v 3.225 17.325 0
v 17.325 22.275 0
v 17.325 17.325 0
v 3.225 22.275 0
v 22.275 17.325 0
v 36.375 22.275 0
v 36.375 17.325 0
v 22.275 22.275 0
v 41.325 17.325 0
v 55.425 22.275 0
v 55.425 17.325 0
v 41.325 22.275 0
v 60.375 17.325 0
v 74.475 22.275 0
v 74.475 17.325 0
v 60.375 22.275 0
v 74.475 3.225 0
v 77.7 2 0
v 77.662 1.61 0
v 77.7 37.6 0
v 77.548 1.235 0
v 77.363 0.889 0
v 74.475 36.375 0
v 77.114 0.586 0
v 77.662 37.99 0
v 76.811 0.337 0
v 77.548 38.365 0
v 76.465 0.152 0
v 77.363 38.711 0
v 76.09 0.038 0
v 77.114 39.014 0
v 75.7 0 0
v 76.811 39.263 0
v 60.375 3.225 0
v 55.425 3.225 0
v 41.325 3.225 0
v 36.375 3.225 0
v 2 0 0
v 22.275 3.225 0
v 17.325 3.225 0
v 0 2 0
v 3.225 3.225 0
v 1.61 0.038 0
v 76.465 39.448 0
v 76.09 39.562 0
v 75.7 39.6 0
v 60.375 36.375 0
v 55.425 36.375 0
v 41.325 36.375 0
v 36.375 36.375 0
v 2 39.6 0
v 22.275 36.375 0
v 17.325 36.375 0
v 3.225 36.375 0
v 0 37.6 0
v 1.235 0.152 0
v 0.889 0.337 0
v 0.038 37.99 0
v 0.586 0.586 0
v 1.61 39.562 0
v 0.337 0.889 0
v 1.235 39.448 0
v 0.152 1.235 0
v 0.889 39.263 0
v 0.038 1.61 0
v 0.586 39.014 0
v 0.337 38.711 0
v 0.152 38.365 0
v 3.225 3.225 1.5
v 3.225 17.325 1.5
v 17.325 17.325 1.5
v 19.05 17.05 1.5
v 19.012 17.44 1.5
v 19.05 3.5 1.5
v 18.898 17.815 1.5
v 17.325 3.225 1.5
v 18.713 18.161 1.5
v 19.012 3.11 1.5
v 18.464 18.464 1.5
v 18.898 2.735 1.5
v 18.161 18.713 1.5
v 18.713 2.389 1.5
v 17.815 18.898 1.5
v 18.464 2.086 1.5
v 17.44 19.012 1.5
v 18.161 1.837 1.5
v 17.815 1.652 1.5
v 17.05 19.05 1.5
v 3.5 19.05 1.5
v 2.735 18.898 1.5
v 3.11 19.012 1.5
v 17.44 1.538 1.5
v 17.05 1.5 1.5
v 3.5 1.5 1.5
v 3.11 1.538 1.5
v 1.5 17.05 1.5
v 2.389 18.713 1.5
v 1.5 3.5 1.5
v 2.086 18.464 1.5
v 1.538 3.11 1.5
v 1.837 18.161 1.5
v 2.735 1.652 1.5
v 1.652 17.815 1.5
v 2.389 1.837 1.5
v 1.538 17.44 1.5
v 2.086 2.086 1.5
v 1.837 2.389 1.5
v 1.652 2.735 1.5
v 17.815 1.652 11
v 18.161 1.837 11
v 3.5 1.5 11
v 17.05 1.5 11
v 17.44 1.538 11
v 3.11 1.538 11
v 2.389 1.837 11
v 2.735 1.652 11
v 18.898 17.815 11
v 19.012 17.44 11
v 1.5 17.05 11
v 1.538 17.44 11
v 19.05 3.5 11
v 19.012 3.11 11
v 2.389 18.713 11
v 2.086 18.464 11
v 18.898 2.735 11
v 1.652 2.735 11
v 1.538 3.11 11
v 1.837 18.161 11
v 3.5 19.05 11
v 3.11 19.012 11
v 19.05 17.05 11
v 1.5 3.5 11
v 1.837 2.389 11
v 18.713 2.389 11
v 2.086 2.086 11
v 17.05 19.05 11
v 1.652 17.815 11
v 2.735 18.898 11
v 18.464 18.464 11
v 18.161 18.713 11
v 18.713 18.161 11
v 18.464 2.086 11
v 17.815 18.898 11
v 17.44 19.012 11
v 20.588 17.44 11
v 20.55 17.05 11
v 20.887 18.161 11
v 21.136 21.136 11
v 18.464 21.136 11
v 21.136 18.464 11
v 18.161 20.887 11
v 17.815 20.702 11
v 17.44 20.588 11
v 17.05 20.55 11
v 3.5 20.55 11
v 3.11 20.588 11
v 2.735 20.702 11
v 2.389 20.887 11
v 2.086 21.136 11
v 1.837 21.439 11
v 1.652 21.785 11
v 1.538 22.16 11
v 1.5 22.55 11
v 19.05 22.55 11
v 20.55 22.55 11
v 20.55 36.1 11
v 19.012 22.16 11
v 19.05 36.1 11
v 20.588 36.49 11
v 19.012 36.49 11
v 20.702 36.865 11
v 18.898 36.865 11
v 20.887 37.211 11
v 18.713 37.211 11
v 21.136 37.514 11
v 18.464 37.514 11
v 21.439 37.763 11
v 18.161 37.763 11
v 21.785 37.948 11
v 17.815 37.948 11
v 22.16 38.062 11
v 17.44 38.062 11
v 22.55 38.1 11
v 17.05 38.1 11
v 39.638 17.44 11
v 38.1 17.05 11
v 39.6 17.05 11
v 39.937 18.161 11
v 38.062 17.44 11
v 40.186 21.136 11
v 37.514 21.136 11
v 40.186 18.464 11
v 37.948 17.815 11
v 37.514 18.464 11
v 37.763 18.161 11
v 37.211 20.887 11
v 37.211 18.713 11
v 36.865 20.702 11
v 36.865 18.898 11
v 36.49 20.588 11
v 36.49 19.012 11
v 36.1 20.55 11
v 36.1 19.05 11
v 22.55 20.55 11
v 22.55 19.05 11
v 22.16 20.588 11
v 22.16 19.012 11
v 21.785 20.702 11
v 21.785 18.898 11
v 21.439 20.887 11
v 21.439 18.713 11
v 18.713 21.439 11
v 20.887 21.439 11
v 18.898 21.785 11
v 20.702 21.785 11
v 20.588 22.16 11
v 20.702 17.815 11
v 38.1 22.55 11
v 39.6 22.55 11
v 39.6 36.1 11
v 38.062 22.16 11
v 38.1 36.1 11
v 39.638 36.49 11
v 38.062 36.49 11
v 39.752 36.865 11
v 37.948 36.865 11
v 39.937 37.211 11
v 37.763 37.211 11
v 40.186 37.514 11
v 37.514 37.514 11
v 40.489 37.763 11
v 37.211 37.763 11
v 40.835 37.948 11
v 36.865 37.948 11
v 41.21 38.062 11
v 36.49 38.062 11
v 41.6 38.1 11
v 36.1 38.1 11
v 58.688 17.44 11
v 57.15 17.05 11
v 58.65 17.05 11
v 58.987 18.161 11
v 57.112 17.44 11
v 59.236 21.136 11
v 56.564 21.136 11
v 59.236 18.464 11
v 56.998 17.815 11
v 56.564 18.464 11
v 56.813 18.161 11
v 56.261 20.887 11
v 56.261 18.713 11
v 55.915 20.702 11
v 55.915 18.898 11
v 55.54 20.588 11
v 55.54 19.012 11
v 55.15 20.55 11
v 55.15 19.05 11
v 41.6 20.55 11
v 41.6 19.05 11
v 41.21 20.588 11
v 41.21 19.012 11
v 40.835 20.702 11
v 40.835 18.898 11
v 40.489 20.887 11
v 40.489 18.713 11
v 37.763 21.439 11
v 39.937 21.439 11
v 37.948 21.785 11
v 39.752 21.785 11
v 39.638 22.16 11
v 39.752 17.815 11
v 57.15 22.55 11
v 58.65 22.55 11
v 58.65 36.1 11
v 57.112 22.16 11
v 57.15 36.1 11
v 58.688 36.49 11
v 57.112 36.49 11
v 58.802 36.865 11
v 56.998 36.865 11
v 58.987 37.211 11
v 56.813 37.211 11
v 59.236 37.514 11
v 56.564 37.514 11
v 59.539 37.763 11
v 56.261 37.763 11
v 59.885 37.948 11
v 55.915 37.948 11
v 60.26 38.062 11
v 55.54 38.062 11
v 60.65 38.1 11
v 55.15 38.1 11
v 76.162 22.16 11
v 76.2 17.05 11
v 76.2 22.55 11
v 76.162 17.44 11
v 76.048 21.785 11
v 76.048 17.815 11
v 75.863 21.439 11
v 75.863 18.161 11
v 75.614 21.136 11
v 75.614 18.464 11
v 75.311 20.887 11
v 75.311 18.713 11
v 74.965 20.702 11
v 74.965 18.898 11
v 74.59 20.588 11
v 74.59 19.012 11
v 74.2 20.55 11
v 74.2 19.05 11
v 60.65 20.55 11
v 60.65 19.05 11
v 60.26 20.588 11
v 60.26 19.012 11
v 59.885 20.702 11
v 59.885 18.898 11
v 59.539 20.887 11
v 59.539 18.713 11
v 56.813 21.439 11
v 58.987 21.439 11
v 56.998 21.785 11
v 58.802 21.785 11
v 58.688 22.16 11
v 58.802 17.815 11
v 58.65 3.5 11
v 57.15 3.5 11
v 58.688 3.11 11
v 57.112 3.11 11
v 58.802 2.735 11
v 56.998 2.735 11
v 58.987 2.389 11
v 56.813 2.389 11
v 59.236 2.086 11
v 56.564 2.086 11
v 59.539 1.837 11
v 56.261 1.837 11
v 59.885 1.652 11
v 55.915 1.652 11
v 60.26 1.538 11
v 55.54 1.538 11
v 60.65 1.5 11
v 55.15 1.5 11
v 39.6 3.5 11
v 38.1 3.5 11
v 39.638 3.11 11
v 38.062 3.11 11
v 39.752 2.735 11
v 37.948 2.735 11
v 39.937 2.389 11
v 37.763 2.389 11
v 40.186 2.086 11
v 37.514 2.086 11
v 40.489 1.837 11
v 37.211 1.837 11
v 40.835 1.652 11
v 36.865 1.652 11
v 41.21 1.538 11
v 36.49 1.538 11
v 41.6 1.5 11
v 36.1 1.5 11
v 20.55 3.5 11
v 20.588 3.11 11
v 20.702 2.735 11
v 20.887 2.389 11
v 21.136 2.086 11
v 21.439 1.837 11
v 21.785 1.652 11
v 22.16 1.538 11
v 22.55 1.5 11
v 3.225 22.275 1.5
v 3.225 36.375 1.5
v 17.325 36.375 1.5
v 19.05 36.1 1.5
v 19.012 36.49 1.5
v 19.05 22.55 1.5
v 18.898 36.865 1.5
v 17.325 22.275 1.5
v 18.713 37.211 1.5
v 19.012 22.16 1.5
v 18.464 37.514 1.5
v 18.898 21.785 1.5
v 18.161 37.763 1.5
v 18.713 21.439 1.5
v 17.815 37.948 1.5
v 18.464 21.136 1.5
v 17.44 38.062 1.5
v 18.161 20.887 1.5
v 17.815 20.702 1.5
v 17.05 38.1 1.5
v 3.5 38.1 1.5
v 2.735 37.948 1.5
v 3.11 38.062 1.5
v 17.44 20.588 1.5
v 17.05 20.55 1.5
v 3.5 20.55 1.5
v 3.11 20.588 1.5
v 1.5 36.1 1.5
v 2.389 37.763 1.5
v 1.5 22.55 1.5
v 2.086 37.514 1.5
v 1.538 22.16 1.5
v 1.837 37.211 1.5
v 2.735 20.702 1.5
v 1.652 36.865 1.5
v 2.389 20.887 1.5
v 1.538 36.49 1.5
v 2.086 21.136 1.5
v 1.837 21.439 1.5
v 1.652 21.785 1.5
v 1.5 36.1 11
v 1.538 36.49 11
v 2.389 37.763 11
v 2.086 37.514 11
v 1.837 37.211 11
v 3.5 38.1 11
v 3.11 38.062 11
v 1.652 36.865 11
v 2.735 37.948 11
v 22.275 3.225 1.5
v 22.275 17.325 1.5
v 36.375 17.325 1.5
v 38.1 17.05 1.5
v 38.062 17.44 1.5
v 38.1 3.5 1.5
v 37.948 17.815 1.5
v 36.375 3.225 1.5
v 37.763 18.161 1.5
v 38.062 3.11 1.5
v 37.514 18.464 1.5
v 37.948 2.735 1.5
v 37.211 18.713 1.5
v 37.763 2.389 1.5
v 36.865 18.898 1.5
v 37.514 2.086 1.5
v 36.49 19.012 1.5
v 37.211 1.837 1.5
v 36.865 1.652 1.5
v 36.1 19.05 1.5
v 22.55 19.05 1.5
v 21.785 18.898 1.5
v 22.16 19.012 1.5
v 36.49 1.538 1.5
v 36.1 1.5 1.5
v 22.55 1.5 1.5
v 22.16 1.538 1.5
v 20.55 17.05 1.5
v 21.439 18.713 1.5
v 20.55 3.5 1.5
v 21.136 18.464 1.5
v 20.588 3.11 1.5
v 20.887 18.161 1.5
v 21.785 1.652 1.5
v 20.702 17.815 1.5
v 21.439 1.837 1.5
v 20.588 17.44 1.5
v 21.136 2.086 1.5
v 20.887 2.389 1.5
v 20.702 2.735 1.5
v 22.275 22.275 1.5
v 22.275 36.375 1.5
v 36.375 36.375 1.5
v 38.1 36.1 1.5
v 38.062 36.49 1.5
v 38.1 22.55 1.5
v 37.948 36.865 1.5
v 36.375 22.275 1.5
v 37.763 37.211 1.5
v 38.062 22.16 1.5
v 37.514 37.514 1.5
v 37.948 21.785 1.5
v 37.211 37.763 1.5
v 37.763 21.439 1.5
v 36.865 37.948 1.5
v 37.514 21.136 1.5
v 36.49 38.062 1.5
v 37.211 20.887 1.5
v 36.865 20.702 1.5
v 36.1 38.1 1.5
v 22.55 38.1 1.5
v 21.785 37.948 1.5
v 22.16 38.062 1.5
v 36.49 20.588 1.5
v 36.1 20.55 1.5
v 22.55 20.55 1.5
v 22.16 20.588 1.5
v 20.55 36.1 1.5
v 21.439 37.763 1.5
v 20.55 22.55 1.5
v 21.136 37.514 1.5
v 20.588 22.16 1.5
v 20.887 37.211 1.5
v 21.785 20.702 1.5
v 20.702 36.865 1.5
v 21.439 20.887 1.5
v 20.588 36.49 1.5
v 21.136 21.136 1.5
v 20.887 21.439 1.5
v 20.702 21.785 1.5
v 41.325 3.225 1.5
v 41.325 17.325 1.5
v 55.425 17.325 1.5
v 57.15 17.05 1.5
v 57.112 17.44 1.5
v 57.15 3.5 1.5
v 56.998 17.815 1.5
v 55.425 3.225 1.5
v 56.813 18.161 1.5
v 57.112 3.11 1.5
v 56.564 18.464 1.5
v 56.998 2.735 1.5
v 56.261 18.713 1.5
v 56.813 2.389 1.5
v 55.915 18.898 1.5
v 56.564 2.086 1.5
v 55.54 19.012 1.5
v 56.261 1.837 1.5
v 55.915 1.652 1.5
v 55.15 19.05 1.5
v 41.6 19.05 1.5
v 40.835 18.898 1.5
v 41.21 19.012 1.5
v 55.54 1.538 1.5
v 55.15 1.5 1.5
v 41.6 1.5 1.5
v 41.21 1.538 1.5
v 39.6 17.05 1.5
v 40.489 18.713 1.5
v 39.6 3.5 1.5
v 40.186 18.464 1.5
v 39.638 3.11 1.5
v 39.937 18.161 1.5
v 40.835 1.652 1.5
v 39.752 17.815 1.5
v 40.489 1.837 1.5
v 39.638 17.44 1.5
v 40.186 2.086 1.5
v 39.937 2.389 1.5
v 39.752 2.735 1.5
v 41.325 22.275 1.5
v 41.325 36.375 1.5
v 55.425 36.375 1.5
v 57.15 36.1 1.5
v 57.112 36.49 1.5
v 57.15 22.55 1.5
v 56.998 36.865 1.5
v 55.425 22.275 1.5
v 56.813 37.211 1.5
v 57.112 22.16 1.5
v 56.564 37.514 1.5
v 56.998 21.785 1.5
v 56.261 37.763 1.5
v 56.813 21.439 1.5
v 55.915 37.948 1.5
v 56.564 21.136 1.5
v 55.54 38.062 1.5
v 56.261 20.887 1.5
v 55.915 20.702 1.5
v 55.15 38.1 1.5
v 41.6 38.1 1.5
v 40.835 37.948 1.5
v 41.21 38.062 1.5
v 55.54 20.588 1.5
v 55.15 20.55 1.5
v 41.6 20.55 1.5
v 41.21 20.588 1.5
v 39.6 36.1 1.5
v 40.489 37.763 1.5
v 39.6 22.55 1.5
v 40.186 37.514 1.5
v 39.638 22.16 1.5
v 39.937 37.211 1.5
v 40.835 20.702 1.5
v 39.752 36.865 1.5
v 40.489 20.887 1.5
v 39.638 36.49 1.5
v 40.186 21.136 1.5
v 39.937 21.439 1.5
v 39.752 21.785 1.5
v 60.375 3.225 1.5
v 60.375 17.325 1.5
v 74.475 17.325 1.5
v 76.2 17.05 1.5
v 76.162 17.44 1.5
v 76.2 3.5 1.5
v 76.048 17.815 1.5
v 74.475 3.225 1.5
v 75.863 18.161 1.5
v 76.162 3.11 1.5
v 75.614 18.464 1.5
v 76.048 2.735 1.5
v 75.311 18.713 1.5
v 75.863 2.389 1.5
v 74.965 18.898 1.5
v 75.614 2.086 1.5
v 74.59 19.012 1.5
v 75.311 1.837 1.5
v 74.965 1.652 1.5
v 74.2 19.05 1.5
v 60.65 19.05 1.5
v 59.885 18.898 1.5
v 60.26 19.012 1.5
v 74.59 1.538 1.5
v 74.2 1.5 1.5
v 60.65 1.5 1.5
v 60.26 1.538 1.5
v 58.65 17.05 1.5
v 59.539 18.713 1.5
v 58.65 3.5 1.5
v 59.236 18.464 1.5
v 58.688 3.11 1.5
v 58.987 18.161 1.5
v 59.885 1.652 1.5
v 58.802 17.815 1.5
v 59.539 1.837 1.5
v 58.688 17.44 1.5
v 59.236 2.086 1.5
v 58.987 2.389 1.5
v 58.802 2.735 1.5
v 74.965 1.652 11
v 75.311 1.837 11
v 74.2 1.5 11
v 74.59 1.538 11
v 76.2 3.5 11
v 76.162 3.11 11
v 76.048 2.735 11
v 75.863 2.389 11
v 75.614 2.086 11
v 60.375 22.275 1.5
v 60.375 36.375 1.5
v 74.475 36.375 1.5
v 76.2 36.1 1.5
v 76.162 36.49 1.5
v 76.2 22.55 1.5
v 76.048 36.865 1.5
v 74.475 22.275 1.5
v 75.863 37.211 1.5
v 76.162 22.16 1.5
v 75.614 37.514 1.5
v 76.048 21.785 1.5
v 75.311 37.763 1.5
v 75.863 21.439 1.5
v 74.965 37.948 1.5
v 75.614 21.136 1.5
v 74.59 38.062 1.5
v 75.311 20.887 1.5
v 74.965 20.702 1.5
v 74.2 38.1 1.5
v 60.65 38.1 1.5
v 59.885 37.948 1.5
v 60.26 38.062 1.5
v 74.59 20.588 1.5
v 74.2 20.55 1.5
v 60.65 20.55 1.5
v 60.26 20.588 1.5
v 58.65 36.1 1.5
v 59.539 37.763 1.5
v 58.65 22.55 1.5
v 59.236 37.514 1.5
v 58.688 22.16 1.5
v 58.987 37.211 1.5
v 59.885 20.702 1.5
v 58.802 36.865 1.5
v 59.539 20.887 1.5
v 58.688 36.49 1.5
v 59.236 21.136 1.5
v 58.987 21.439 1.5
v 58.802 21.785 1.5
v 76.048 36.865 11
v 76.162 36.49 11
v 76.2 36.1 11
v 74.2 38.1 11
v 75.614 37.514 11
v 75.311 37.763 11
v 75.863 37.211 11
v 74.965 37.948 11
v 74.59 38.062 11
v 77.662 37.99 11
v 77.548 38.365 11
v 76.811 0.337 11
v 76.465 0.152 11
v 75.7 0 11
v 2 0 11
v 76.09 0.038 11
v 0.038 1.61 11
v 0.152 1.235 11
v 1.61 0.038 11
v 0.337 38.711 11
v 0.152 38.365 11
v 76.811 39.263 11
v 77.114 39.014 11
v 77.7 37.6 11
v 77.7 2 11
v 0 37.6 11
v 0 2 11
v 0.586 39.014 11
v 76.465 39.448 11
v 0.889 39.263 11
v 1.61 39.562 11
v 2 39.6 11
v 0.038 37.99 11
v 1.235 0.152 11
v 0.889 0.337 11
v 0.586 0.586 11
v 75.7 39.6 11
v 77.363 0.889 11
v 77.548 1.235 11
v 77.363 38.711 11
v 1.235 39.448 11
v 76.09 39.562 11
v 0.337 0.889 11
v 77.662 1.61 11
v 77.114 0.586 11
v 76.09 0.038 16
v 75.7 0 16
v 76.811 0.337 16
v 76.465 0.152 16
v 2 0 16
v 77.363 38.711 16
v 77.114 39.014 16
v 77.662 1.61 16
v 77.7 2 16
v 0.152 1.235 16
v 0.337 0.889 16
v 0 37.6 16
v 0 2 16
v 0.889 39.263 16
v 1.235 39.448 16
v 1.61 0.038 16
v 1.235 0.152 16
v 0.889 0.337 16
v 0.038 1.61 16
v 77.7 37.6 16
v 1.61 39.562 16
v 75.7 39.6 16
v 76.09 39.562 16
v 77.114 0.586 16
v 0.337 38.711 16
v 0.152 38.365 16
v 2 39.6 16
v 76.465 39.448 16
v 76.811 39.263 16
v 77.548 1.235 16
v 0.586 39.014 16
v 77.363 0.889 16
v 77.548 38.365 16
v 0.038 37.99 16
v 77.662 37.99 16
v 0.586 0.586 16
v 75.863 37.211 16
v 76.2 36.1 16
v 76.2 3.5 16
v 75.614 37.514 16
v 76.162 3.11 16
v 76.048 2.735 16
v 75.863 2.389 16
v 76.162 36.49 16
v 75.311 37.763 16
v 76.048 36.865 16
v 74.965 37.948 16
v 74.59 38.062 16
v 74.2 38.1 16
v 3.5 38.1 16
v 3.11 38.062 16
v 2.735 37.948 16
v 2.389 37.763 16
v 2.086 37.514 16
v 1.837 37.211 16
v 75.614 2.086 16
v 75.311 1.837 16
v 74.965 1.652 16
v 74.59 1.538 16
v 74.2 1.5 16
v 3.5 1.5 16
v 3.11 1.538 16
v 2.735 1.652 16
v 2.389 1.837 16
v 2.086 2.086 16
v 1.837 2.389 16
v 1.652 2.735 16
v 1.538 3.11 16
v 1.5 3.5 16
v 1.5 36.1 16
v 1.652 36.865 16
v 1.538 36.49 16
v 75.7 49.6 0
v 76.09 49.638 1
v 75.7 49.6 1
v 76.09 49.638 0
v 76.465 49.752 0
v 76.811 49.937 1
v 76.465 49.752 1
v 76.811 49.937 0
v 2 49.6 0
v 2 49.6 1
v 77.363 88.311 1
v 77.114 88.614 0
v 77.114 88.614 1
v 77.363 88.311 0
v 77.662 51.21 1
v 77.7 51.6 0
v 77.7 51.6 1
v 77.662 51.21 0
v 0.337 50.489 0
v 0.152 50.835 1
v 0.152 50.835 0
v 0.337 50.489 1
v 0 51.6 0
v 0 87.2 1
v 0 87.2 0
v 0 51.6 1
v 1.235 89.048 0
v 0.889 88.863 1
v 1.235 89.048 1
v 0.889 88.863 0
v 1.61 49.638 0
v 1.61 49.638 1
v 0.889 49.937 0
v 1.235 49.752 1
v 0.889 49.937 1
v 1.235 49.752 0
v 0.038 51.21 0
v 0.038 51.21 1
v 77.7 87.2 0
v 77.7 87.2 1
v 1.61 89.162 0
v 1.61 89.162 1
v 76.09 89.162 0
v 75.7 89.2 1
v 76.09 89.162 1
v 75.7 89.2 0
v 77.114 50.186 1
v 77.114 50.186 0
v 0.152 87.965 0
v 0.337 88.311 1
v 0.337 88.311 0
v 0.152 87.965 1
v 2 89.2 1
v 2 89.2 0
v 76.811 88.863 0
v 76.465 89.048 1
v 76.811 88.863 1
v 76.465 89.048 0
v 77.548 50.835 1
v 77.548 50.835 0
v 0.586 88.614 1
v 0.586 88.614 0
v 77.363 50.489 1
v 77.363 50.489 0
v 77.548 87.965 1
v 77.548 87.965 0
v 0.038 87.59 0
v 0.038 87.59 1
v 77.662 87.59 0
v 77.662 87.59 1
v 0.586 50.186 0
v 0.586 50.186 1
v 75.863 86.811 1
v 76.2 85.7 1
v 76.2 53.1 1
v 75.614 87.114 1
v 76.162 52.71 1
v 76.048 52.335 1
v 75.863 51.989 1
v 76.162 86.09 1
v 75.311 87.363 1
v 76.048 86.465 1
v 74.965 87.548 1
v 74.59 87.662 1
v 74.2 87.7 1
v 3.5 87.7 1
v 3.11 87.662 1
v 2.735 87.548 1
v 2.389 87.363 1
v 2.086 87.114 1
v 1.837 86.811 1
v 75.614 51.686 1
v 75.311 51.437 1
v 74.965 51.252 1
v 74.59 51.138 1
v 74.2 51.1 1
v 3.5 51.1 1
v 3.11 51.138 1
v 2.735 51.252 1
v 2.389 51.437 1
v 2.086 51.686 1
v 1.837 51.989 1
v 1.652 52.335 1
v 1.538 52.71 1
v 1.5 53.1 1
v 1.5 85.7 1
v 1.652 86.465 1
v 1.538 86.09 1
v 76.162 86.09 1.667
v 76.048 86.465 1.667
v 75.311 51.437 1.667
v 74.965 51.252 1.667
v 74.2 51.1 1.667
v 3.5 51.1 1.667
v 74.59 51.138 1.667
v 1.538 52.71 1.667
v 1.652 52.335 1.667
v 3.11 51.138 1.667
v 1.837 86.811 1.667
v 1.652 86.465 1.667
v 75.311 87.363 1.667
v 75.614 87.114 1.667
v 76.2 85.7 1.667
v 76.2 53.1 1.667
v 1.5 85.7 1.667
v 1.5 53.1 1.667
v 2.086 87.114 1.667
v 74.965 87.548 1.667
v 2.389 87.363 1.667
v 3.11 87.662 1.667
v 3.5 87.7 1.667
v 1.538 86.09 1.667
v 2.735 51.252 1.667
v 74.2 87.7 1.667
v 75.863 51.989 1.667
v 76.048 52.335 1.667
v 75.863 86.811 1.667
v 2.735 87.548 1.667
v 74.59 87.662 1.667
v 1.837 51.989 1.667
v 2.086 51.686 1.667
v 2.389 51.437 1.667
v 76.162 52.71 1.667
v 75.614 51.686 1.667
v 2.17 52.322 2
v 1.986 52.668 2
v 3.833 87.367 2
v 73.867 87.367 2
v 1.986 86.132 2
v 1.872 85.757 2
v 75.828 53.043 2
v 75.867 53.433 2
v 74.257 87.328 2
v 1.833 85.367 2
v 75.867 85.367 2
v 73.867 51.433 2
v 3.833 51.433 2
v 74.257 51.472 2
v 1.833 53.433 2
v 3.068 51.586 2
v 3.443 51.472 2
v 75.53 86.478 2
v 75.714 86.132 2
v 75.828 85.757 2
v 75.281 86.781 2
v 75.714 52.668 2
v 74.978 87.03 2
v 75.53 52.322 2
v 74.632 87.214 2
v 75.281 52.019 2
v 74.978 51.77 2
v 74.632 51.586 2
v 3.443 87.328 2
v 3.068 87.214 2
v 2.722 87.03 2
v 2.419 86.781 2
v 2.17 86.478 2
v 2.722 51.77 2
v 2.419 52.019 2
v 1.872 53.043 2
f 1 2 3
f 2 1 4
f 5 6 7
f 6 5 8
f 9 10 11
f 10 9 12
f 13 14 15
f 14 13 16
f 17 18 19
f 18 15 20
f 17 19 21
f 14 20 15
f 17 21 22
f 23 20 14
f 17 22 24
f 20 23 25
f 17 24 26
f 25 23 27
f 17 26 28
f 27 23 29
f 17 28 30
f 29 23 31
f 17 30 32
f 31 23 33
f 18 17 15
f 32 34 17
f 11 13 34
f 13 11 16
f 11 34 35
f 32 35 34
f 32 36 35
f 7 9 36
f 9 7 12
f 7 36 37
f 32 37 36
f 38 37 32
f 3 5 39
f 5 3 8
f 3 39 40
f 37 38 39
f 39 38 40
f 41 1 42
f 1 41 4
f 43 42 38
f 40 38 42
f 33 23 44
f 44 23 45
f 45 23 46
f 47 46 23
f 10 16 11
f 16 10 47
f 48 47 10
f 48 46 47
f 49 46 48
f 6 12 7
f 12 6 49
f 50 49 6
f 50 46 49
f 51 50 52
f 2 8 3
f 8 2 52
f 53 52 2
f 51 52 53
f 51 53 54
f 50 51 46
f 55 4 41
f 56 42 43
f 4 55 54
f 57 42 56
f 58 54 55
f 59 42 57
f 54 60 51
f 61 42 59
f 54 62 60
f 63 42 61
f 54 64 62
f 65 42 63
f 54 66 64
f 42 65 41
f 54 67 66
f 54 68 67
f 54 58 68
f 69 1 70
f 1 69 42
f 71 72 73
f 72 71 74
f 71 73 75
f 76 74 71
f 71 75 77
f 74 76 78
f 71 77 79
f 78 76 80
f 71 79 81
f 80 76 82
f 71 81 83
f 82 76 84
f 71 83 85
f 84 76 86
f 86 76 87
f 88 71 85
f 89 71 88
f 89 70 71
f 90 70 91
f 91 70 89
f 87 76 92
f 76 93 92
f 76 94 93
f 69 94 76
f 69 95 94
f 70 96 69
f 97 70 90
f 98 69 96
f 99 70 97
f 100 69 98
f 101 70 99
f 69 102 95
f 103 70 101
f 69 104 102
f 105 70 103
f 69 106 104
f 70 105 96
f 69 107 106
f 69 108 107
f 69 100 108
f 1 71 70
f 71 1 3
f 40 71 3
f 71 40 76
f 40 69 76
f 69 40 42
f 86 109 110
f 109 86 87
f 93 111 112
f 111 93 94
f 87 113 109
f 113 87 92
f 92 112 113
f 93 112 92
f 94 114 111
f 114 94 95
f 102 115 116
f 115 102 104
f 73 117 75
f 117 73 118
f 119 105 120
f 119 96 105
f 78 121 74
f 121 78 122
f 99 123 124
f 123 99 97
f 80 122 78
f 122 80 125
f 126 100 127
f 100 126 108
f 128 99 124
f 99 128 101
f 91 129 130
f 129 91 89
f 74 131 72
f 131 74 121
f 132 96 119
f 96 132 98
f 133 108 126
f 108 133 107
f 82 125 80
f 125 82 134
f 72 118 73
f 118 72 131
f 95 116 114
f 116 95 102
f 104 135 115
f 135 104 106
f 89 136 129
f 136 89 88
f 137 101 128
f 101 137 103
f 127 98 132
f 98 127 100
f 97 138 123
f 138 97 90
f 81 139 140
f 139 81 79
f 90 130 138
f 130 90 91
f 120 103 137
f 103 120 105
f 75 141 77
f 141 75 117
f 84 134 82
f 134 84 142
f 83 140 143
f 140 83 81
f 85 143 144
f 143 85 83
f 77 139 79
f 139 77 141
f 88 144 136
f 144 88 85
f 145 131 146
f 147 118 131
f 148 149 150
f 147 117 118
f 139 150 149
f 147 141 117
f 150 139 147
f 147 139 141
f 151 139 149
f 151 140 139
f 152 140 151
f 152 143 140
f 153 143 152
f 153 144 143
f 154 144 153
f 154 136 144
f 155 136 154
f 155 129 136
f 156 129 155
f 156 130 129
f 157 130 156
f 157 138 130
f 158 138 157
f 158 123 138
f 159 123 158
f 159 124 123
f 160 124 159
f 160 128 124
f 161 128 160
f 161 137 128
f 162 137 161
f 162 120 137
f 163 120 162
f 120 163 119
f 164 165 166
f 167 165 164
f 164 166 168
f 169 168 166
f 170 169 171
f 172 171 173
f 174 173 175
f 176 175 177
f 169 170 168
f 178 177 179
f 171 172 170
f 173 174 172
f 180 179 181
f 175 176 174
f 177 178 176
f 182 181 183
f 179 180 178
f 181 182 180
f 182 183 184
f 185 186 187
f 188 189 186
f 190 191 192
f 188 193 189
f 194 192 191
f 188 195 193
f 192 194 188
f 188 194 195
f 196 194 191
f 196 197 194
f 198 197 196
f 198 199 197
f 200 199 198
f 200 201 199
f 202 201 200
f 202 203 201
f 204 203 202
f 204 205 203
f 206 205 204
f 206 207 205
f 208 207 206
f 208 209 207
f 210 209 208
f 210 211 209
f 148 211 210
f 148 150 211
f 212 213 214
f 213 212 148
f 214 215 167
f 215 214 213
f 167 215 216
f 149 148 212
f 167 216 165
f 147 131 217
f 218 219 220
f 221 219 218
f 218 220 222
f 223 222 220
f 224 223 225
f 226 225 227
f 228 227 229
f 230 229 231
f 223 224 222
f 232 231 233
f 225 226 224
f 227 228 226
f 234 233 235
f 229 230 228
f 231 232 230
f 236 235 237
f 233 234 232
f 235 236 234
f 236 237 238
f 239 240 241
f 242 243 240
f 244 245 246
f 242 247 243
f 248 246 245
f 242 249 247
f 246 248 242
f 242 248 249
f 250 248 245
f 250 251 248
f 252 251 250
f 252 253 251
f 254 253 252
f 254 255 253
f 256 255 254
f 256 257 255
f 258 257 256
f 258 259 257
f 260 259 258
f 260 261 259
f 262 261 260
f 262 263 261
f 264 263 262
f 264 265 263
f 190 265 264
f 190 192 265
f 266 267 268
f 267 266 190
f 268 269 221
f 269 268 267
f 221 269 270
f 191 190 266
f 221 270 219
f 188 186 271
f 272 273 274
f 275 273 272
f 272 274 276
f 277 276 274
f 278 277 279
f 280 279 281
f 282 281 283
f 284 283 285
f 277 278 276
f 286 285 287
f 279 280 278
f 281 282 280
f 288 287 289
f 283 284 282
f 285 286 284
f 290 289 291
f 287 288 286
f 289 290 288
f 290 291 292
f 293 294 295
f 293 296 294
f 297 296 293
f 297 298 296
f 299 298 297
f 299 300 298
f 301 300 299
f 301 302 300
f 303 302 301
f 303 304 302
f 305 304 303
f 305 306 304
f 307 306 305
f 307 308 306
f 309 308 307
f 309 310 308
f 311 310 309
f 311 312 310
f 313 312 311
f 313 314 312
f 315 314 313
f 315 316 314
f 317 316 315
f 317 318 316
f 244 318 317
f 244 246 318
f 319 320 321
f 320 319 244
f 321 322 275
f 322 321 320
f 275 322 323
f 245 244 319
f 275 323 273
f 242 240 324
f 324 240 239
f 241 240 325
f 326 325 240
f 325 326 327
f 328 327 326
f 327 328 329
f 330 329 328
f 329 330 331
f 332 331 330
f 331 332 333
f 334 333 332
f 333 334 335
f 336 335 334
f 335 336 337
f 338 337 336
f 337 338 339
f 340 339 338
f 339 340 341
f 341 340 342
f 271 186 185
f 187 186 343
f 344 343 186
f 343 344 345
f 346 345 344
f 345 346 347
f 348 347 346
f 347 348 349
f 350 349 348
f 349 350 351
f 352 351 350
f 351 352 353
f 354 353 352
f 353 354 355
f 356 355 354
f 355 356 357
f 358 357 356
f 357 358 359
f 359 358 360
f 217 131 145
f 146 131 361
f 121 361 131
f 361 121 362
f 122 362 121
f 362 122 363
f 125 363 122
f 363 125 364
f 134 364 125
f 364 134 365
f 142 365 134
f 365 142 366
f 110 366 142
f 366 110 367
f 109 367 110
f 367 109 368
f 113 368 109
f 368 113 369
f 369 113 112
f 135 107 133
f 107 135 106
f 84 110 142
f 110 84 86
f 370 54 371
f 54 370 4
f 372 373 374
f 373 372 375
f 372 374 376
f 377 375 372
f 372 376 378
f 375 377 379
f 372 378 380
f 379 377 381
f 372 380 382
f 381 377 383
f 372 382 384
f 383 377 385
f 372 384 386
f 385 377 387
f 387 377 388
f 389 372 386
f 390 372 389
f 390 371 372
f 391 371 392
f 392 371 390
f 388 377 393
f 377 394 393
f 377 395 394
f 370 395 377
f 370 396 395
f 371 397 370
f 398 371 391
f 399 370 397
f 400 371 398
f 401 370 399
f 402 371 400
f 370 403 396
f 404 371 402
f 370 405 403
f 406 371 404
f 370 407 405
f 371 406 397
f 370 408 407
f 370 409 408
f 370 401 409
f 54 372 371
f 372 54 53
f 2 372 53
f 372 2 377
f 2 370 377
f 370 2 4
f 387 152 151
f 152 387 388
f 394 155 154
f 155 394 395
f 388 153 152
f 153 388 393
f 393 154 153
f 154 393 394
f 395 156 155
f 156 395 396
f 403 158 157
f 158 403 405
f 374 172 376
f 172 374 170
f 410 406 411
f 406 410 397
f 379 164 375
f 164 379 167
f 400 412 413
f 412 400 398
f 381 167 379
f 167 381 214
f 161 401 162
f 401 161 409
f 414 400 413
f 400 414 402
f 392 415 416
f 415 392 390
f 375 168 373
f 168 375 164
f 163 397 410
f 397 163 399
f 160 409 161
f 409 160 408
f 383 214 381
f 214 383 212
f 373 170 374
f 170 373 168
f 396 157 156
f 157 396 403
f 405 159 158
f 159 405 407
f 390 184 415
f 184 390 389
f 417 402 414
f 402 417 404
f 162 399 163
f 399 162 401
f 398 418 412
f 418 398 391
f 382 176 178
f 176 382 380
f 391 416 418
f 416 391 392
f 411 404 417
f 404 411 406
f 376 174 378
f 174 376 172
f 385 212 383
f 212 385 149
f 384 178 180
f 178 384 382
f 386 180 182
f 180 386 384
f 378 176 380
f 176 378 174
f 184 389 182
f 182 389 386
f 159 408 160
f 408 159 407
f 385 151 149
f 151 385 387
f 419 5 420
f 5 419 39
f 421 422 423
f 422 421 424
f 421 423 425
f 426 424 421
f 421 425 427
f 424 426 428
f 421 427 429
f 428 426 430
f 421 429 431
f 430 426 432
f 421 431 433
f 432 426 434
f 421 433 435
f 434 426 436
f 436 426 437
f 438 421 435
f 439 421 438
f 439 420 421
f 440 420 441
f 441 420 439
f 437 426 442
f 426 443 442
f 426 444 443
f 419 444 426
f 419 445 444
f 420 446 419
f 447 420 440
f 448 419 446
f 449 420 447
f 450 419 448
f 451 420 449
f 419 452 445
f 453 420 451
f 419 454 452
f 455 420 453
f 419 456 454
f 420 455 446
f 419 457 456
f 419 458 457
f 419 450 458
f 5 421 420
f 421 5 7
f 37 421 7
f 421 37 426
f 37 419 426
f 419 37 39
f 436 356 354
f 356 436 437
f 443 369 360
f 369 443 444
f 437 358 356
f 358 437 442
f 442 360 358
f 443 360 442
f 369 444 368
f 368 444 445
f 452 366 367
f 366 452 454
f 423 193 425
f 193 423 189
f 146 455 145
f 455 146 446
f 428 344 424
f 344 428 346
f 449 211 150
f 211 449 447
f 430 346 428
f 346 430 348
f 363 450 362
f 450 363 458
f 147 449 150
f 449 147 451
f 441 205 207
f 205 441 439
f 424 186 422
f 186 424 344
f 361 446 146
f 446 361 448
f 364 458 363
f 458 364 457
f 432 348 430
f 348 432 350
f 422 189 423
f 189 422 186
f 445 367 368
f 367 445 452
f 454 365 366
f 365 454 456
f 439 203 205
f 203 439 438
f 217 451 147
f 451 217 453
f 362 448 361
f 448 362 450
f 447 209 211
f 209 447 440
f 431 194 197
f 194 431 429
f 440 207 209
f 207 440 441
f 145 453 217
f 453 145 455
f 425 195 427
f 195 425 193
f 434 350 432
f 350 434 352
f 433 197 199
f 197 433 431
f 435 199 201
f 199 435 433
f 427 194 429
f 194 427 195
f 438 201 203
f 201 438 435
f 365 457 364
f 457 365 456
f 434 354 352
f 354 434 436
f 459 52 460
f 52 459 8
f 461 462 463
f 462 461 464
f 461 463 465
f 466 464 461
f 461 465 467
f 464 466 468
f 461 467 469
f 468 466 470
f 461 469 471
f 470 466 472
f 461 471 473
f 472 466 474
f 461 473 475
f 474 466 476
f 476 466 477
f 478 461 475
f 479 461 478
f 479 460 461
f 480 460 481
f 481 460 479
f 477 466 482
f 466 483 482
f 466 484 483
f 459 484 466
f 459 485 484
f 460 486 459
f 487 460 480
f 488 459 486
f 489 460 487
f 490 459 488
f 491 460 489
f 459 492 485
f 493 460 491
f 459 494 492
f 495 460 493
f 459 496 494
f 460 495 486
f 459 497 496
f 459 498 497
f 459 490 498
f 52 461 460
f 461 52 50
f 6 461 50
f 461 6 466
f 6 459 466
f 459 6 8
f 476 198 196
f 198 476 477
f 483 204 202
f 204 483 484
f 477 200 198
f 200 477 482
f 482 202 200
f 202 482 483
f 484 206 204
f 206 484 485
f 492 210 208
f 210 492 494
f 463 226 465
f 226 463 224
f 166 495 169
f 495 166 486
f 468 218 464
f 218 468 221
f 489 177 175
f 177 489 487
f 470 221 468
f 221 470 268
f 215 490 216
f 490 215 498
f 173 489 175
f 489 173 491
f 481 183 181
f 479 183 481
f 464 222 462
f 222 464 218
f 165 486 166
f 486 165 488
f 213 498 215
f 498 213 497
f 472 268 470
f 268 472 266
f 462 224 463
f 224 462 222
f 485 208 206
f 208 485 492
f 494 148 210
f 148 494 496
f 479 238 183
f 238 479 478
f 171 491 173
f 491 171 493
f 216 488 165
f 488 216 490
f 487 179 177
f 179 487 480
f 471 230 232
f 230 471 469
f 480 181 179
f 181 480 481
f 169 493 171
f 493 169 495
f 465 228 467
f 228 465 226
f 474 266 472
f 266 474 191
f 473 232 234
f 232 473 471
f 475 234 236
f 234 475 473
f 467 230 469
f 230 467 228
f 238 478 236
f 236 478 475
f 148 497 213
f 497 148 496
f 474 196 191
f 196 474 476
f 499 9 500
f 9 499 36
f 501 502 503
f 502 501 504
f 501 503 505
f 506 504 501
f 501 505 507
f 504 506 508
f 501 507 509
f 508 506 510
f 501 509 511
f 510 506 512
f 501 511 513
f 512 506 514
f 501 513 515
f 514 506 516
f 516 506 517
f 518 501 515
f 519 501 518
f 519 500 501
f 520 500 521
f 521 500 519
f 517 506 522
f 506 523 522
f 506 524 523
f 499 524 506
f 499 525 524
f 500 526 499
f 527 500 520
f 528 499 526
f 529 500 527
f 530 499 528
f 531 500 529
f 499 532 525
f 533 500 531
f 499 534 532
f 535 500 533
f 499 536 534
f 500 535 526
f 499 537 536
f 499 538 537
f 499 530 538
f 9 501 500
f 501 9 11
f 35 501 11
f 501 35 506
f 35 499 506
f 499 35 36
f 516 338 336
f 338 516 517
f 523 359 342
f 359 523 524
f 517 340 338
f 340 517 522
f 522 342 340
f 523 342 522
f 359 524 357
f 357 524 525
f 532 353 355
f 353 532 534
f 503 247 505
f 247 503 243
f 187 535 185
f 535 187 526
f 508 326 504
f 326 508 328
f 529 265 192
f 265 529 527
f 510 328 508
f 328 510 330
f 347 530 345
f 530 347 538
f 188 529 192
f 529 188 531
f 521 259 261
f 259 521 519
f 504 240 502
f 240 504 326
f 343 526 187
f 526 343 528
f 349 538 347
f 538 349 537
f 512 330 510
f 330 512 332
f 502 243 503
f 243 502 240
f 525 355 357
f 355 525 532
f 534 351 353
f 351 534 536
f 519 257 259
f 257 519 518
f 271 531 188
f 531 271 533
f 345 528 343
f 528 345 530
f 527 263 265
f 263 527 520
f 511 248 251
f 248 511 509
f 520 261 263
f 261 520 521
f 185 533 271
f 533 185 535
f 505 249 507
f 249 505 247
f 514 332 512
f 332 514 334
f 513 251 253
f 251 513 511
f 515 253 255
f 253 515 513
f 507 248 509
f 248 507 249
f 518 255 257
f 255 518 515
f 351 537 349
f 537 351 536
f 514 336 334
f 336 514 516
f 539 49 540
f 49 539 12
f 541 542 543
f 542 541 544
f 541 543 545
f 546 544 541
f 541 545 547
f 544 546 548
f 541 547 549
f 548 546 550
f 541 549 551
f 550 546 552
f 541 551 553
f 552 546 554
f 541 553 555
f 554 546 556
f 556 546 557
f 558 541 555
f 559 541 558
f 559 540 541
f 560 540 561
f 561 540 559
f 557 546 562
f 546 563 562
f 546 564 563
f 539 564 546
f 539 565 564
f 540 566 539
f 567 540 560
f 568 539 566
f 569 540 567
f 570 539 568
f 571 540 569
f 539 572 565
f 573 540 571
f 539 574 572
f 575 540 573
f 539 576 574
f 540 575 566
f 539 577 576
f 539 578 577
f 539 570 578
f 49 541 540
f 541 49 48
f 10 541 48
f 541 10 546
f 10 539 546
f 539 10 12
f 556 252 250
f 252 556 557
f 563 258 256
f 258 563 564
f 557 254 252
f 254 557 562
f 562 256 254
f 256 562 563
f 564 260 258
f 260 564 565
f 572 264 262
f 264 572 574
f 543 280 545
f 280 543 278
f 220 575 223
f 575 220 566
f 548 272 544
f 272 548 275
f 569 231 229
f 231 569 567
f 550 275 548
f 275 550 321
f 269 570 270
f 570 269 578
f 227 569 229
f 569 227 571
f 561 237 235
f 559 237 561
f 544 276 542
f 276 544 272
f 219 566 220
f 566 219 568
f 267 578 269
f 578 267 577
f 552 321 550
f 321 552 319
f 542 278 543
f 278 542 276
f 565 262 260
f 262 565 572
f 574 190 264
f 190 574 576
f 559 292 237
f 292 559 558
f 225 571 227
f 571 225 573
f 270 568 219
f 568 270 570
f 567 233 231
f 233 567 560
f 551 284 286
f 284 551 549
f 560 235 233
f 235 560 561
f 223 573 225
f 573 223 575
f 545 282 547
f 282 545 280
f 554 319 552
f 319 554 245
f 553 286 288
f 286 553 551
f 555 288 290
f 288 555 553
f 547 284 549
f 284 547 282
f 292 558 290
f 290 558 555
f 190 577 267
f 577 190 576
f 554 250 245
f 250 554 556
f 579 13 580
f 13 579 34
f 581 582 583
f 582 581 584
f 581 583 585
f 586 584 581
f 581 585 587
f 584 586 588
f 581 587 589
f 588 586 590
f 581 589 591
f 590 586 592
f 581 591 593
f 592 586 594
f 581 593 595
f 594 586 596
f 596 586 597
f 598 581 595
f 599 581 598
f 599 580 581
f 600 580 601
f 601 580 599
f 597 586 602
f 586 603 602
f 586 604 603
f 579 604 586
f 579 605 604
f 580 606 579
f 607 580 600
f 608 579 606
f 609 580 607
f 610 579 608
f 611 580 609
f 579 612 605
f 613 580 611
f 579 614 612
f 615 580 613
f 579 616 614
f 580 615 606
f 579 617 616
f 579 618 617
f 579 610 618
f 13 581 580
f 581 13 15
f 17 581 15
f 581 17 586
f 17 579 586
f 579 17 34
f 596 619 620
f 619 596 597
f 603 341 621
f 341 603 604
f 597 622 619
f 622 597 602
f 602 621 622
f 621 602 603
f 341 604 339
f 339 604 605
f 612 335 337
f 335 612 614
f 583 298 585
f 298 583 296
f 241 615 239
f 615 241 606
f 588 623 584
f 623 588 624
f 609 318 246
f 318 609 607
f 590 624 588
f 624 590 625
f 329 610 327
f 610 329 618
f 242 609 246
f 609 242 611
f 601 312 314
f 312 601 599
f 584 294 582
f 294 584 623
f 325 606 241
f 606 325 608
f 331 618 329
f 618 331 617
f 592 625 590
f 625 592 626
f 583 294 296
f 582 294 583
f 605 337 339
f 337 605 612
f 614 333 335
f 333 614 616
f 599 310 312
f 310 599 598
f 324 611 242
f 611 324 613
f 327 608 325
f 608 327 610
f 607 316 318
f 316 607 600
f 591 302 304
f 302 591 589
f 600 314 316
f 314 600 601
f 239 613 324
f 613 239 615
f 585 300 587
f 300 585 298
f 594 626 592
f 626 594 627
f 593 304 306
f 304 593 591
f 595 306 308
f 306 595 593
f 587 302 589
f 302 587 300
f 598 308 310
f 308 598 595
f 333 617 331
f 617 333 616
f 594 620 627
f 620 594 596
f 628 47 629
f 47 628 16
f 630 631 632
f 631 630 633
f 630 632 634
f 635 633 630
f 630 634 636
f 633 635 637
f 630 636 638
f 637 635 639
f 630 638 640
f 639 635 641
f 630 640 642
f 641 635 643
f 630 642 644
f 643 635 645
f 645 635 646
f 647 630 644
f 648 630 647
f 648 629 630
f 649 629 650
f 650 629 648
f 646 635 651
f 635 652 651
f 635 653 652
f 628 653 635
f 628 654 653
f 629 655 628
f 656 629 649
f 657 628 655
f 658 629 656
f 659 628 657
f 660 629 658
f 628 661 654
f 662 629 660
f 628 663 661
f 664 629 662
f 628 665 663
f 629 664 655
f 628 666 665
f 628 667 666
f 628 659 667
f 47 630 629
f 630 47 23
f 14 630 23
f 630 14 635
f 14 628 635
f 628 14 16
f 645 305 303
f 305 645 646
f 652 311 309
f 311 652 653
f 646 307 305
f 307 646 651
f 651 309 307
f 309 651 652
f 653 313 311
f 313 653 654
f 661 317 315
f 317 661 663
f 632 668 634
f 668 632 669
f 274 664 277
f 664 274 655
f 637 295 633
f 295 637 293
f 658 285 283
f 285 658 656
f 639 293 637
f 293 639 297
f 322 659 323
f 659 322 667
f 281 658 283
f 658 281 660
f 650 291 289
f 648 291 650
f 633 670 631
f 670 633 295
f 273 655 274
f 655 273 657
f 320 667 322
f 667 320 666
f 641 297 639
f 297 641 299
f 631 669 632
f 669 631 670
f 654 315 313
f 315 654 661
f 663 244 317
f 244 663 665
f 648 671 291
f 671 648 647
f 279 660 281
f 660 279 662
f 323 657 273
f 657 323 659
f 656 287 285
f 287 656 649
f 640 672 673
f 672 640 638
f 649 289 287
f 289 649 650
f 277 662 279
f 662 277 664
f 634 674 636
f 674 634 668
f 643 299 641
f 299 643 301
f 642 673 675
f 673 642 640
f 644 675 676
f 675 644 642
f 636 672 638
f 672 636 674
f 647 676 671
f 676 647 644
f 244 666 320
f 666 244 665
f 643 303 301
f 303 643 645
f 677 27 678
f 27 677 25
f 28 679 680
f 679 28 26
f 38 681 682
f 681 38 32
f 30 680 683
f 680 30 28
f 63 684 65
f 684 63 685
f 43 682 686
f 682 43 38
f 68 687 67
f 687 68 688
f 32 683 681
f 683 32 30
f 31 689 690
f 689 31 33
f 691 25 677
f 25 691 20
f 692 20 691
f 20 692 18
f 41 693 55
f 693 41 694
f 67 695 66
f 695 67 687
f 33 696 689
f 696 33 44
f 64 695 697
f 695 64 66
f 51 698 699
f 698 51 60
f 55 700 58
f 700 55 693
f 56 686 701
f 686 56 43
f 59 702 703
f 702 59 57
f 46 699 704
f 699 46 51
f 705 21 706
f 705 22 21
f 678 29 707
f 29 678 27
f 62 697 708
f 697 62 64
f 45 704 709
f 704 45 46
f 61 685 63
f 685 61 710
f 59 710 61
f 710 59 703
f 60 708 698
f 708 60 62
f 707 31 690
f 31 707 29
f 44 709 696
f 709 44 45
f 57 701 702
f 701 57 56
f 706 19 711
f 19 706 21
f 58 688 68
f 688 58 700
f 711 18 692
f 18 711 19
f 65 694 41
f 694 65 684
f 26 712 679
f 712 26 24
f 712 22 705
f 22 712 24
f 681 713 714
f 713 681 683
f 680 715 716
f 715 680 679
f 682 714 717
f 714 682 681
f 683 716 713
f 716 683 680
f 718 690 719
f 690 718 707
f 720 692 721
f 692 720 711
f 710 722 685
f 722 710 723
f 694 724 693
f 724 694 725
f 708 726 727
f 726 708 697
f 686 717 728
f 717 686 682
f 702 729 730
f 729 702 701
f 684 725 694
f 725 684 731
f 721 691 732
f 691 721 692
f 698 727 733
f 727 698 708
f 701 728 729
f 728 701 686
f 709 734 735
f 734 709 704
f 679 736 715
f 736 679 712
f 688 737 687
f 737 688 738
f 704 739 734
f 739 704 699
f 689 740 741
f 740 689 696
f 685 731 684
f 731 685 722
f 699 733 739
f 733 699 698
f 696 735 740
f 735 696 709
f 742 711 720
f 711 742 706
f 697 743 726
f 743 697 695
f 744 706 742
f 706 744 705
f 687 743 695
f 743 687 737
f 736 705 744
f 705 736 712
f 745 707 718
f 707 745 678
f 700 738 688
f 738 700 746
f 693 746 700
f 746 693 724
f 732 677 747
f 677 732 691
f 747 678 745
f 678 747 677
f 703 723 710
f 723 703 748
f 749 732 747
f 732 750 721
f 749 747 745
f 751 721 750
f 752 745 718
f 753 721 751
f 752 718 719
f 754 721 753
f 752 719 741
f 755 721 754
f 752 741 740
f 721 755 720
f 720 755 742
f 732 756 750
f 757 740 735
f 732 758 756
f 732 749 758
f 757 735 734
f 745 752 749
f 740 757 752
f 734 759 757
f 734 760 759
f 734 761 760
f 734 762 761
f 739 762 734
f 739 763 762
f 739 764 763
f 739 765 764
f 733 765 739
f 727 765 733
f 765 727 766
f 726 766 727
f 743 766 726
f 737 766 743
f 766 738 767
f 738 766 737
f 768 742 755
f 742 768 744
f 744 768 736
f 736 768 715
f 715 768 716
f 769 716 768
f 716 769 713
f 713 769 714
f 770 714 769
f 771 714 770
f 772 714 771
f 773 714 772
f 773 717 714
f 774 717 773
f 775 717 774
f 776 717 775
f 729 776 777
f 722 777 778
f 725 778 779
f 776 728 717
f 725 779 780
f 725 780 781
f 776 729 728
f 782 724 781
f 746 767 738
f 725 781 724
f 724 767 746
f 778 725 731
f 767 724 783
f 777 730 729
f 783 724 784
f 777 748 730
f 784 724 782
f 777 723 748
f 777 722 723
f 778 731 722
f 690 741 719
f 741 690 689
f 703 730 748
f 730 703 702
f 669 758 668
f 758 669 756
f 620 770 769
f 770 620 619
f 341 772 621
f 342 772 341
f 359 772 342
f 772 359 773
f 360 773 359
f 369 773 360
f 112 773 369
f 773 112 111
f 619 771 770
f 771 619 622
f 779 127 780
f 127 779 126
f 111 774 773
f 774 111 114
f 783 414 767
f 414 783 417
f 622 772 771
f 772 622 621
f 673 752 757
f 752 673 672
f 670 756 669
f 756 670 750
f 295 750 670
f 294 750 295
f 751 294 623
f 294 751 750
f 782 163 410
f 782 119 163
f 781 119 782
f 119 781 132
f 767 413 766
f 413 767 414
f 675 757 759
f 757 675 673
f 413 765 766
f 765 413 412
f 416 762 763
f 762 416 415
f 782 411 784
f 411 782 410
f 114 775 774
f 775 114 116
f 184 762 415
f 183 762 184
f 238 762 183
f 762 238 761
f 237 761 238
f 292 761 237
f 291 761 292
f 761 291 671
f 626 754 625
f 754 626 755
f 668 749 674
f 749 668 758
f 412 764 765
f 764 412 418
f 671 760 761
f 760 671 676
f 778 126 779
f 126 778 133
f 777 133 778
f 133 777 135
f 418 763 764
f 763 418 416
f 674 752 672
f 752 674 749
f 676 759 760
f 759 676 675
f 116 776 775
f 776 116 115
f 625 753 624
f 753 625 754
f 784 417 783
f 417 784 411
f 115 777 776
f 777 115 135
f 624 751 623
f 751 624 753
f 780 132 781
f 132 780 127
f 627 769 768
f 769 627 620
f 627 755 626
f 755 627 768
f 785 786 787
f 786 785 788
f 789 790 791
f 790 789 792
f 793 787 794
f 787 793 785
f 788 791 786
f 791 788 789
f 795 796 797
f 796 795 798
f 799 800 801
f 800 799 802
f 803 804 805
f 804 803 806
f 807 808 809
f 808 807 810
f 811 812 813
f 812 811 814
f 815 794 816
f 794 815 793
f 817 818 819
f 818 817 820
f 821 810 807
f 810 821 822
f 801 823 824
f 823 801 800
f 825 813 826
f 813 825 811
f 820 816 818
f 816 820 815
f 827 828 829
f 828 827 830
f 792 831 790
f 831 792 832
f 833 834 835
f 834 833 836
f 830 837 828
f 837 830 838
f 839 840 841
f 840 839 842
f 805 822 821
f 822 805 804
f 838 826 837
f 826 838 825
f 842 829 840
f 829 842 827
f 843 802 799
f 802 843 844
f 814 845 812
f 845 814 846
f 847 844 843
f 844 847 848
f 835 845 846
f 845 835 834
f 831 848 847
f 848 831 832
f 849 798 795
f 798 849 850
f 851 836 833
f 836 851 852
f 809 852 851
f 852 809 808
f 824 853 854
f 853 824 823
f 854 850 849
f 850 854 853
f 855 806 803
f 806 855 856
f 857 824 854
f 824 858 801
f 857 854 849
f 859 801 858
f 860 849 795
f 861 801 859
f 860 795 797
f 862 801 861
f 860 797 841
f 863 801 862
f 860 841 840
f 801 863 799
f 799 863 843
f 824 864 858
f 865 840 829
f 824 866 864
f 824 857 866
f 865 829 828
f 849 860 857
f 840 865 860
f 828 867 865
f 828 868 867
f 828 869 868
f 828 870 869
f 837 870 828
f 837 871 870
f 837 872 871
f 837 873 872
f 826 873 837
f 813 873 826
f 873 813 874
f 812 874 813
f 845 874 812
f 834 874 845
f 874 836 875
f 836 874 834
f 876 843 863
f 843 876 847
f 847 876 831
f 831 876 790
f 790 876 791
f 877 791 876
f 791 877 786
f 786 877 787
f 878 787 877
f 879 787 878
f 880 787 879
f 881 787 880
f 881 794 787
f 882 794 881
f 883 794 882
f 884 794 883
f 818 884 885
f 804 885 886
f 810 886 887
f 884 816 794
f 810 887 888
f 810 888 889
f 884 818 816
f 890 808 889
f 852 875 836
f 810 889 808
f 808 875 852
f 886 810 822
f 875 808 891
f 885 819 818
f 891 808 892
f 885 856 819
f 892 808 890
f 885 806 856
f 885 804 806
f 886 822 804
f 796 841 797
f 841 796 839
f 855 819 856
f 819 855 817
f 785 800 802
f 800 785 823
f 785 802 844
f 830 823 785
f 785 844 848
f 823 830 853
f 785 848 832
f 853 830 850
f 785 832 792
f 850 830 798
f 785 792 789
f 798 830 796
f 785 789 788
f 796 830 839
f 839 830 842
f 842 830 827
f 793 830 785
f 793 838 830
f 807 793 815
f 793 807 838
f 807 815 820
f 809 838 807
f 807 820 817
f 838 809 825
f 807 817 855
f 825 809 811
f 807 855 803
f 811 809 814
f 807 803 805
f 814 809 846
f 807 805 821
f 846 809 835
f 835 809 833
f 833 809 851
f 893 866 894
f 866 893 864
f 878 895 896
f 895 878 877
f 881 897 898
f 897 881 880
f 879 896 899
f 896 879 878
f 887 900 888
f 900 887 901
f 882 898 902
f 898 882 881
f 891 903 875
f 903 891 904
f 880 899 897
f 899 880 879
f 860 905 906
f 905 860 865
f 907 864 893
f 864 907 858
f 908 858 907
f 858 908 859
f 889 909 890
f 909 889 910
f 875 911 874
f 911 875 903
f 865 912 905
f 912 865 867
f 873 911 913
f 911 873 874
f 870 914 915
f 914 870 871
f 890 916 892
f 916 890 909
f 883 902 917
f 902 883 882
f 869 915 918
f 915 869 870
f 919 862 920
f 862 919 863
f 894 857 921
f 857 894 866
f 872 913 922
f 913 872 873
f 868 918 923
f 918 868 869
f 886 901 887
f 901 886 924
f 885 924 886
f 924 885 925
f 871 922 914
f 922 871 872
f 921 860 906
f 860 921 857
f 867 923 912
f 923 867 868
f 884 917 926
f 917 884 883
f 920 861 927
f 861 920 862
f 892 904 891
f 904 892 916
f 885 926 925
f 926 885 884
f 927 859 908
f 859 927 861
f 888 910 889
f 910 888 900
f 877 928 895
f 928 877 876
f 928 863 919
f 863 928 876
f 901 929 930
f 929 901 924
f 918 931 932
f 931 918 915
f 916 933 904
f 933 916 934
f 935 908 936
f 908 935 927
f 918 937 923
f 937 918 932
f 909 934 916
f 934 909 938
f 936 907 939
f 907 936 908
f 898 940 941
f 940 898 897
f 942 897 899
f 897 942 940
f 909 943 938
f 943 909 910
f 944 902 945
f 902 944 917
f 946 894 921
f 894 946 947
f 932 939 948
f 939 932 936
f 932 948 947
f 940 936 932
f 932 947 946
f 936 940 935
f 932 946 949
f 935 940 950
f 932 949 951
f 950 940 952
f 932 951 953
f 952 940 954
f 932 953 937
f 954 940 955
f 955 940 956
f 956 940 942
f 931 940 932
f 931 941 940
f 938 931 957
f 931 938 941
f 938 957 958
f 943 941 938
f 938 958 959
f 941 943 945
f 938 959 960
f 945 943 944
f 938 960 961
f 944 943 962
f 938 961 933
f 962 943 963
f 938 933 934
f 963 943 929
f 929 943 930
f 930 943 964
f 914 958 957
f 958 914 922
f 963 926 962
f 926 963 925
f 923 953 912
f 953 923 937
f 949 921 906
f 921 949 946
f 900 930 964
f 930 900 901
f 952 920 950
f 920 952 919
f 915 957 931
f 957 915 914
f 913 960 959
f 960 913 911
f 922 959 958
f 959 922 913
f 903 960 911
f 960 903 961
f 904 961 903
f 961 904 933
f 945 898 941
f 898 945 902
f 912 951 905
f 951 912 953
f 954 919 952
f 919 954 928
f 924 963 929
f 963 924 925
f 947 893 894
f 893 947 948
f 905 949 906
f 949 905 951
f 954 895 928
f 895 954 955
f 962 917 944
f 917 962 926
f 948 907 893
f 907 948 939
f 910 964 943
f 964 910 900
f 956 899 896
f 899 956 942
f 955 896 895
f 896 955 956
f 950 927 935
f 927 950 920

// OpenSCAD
ROWS = 2;
COLUMNS = 4;
SWITCH_HEIGHT = 11;
SKIRT_HEIGHT = 5;
TOLERANCE = 0.1;
PLATE_THICKNESS = 1.5;      // Official spec for Cherry MX is 1.5 ± 0.1 mm
BOTTOM_PLATE_THICKNESS = 1; // Official spec for Cherry MX is 1.5 ± 0.1 mm
WALL_THICKNESS = 1.5;
CORNER_RADIUS = 2;

// See https://matt3o.com/anatomy-of-a-keyboard/
SWITCH_HOLE_SIZE = 14;
SWITCH_DISTANCE_BETWEEN_HOLES = 5.05;

$fn = 32;

keycap_placeholder_space = SWITCH_HOLE_SIZE + SWITCH_DISTANCE_BETWEEN_HOLES;
x_size = keycap_placeholder_space * COLUMNS + WALL_THICKNESS;
y_size = keycap_placeholder_space * ROWS + WALL_THICKNESS;
x_size_corrected = x_size - CORNER_RADIUS * 2;
y_size_corrected = y_size - CORNER_RADIUS * 2;
x_inner_size_corrected = x_size_corrected - WALL_THICKNESS * 2;
y_inner_size_corrected = y_size_corrected - WALL_THICKNESS * 2;

module hole()
{
    translate([ keycap_placeholder_space / 2, keycap_placeholder_space / 2, 0 ])
    {
        // Keycap Mock
        // translate([ 0, 0, 8 ]) color("red") linear_extrude(height = 8) square(keycap_placeholder_space, center =
        // true);

        // Plate hole
        color("blue") linear_extrude(height = PLATE_THICKNESS) square(SWITCH_HOLE_SIZE + TOLERANCE, center = true);

        // Structural hole
        translate([ 0, 0, PLATE_THICKNESS ]) linear_extrude(height = SWITCH_HEIGHT - PLATE_THICKNESS)
            offset(r = CORNER_RADIUS)
                square(keycap_placeholder_space - CORNER_RADIUS * 2 - WALL_THICKNESS, center = true);
    }
}

module main_body()
{
    difference()
    {
        // Body
        translate([ x_size / 2, y_size / 2, 0 ]) difference()
        {
            linear_extrude(height = SWITCH_HEIGHT) offset(r = CORNER_RADIUS)
                square([ x_size_corrected, y_size_corrected ], center = true);

            // hull()
            // {
            //     translate([ 0, 0, SWITCH_HEIGHT / 4 ]) linear_extrude(height = 0.0001)
            //         offset(delta = -WALL_THICKNESS - keycap_placeholder_space / 3)
            //             square([ x_size, y_size ], center = true);
            //     translate([ 0, 0, SWITCH_HEIGHT ]) linear_extrude(height = 0.0001) offset(delta = -WALL_THICKNESS *
            //     2)
            //         square([ x_size, y_size ], center = true);
            // }
        }

        // Holes
        translate([ WALL_THICKNESS / 2, WALL_THICKNESS / 2, 0 ])
        {
            for (column = [0:COLUMNS - 1])
            {
                for (row = [0:ROWS - 1])
                {
                    translate([ column * keycap_placeholder_space, row * keycap_placeholder_space, 0 ]) hole();
                }
            }
        }
    }

    // Skirt
    translate([ x_size / 2, y_size / 2, SWITCH_HEIGHT ]) difference()
    {
        linear_extrude(height = SKIRT_HEIGHT) offset(r = CORNER_RADIUS)
            square([ x_size_corrected, y_size_corrected ], center = true);

        linear_extrude(height = SKIRT_HEIGHT) offset(r = CORNER_RADIUS)
            square([ x_inner_size_corrected, y_inner_size_corrected ], center = true);
    }
}

// remove it and at only support for hall effect sensors
// remove it and at only support for hall effect sensors
// remove it and at only support for hall effect sensors
// remove it and at only support for hall effect sensors
// remove it and at only support for hall effect sensors
// remove it and at only support for hall effect sensors
module bottom_plate()
{
    chamfer_height = 1 / 3;
    chamfer_width = 1 / 3;

    translate([ x_size / 2, y_size / 2, 0 ])
    {
        color("blue") linear_extrude(height = BOTTOM_PLATE_THICKNESS) offset(r = CORNER_RADIUS)
            square([ x_size_corrected, y_size_corrected ], center = true);

        translate([ 0, 0, BOTTOM_PLATE_THICKNESS ]) linear_extrude(height = 1 - chamfer_height)
            offset(r = CORNER_RADIUS) square([ x_inner_size_corrected, y_inner_size_corrected ], center = true);

        translate([ 0, 0, BOTTOM_PLATE_THICKNESS + 1 - chamfer_height ]) hull()
        {
            translate([ 0, 0, 0 ]) linear_extrude(height = 0.0001) offset(r = CORNER_RADIUS)
                square([ x_inner_size_corrected, y_inner_size_corrected ], center = true);
            translate([ 0, 0, chamfer_height ]) linear_extrude(height = 0.0001) offset(r = CORNER_RADIUS)
                square([ x_inner_size_corrected - chamfer_width * 2, y_inner_size_corrected - chamfer_width * 2 ],
                       center = true);
        }
    }
}

module main()
{
    main_body();

    translate([ 0, y_size + 10, 0 ]) bottom_plate();
}

main();
